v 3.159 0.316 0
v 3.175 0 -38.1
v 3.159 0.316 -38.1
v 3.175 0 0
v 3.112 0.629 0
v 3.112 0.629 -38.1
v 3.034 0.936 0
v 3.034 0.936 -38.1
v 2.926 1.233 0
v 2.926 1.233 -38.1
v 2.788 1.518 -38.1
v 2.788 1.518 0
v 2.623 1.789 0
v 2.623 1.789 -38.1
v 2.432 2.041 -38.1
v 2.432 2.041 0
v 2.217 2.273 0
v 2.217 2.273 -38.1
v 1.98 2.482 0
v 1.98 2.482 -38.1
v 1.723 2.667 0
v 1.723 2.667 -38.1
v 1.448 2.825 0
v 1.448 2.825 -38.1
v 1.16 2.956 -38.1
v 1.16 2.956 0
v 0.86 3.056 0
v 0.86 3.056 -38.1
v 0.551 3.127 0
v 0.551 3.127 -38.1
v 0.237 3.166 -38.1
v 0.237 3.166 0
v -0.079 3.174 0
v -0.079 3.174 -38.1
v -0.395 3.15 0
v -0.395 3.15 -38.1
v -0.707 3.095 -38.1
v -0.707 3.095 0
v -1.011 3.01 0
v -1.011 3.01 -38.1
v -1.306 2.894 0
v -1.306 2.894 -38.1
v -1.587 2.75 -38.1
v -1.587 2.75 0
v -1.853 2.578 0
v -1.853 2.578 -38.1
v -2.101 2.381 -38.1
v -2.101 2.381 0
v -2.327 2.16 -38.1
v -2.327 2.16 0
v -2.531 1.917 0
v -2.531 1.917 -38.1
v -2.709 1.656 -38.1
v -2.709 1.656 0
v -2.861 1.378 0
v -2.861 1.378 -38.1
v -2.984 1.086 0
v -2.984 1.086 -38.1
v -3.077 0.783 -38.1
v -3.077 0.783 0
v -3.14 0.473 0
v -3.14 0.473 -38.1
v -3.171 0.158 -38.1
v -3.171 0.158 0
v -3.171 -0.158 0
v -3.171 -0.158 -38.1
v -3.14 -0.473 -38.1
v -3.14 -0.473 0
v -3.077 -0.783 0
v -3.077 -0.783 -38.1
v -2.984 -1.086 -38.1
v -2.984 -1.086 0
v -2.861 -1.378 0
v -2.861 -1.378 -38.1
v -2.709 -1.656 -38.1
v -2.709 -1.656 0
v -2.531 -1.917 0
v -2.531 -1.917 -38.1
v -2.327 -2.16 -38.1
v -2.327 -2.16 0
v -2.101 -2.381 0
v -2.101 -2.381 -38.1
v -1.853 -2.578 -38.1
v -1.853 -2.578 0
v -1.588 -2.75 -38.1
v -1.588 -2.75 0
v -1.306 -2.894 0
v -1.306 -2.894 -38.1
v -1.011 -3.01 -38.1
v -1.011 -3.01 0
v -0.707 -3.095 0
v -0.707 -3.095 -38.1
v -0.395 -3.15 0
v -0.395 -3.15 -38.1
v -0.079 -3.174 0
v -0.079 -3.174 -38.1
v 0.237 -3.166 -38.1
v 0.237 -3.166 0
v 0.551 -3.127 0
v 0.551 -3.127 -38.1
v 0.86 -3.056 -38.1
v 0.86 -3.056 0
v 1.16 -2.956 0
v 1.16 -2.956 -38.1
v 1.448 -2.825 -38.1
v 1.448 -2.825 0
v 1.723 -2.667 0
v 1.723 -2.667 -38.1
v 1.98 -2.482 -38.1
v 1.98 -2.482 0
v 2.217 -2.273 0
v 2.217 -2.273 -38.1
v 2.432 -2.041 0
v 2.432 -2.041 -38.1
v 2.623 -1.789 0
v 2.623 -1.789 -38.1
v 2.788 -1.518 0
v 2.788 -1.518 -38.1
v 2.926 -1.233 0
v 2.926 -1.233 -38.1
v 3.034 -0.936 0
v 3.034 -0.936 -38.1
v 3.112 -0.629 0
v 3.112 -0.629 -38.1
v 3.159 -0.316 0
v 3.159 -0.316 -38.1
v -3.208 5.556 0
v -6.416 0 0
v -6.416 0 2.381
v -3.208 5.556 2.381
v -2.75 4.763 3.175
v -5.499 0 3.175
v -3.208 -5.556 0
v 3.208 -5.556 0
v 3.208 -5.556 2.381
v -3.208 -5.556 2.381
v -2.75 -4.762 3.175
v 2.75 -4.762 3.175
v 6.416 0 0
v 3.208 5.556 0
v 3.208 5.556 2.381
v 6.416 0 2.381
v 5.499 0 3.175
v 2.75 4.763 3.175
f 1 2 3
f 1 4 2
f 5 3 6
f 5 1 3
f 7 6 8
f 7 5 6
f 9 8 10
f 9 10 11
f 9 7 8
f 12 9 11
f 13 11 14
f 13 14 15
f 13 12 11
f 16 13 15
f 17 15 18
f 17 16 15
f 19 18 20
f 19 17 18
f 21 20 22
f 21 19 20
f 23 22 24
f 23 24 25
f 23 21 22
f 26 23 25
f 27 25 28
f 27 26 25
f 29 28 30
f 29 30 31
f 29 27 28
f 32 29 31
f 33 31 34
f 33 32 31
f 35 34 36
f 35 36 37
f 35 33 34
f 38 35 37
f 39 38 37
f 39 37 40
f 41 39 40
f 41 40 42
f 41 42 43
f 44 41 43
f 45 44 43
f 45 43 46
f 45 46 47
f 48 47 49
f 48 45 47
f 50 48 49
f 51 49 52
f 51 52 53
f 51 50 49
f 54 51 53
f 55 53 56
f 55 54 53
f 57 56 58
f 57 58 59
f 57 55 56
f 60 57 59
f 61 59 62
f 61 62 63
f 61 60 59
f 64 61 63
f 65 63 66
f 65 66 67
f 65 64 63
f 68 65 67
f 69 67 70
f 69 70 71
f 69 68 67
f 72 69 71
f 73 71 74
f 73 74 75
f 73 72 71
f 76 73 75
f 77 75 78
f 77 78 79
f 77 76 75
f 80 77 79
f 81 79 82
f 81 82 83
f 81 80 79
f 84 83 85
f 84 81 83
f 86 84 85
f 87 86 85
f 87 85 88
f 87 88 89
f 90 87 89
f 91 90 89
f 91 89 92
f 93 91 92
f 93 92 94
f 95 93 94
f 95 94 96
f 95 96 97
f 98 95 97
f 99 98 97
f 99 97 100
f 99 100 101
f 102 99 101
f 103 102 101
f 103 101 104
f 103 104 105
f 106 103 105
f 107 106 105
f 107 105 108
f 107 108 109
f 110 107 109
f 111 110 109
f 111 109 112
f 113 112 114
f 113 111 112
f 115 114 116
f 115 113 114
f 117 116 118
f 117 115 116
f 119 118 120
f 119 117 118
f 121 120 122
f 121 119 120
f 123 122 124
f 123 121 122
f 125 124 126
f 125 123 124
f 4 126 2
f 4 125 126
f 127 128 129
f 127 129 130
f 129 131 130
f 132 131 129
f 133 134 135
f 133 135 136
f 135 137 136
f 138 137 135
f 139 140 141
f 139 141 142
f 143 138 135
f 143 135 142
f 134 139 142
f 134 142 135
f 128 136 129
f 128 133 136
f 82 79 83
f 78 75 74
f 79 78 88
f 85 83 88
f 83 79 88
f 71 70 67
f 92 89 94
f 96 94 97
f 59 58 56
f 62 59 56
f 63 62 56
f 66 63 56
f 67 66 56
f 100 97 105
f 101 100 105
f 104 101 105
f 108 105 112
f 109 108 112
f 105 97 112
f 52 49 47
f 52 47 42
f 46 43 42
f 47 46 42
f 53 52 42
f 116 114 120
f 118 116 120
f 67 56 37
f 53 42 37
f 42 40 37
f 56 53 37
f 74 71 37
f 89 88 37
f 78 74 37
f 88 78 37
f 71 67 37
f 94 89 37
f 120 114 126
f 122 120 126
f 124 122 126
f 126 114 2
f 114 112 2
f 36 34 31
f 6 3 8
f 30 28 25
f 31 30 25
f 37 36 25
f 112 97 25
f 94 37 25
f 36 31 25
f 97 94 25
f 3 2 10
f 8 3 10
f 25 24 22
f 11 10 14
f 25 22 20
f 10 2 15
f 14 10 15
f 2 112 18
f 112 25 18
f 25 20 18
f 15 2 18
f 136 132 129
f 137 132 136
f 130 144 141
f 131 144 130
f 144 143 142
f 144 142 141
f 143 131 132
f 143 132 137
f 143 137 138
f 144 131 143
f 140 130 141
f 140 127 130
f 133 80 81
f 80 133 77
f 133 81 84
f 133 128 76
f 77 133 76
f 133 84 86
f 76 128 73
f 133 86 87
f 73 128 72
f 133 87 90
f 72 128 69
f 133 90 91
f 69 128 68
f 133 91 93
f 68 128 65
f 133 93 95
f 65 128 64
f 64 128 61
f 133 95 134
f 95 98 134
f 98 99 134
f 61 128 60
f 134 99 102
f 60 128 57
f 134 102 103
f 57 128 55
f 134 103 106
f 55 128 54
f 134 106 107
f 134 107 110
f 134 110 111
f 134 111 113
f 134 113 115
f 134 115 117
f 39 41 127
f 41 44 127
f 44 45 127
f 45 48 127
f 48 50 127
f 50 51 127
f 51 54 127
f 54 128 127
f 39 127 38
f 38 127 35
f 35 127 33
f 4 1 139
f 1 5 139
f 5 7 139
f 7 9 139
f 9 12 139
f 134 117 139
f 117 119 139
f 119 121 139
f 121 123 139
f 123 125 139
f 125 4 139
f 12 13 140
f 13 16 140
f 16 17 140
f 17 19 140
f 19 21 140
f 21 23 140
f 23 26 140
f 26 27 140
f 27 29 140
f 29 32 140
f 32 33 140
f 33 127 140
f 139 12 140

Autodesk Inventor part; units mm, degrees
ref_plane "YZ Plane" through (0, 0, 0) normal (1, 0, 0) x (0, 1, 0)
ref_plane "XZ Plane" through (0, 0, 0) normal (0, 1, 0) x (-1, 0, 0)
ref_plane "XY Plane" through (0, 0, 0) normal (0, 0, 1) x (1, 0, 0)
sketch "Sketch1" plane through (0, 0, 0) normal (0, 0, 1) x (1, 0, 0)
  circle A0 centre (0, 0) radius 3.175
  line L0 (3.2079, 5.5563) -> (6.4158, 0)
  line L1 (6.4158, 0) -> (3.2079, -5.5562)
  line L2 (3.2079, -5.5562) -> (-3.2079, -5.5562)
  line L3 (-3.2079, -5.5562) -> (-6.4158, 0)
  line L4 (-6.4158, 0) -> (-3.2079, 5.5563)
  line L5 (-3.2079, 5.5563) -> (3.2079, 5.5563)
  dimension "d0" = 6.35
  dimension "d1" = 11.1125
extrude "Extrusion1" add sketch "Sketch1" against normal blind 38.1 contours A0
extrude "Extrusion2" add sketch "Sketch1" along normal blind 3.175 contours A0 | L0 L1 L2 L3 L4 L5
thread "Thread1" size "1/4-20 UNC" class "2A" standard "ANSI Unified Screw Threads" full length
chamfer "Chamfer1" distance 0.7937 angle 45 6 edges at (4.8119, 2.7781, 3.175) (0, 5.5563, 3.175) (-4.8119, 2.7781, 3.175) (-4.8119, -2.7781, 3.175) (0, -5.5562, 3.175) (4.8119, -2.7781, 3.175)
properties part number "1.5_bolt_.25_20"
